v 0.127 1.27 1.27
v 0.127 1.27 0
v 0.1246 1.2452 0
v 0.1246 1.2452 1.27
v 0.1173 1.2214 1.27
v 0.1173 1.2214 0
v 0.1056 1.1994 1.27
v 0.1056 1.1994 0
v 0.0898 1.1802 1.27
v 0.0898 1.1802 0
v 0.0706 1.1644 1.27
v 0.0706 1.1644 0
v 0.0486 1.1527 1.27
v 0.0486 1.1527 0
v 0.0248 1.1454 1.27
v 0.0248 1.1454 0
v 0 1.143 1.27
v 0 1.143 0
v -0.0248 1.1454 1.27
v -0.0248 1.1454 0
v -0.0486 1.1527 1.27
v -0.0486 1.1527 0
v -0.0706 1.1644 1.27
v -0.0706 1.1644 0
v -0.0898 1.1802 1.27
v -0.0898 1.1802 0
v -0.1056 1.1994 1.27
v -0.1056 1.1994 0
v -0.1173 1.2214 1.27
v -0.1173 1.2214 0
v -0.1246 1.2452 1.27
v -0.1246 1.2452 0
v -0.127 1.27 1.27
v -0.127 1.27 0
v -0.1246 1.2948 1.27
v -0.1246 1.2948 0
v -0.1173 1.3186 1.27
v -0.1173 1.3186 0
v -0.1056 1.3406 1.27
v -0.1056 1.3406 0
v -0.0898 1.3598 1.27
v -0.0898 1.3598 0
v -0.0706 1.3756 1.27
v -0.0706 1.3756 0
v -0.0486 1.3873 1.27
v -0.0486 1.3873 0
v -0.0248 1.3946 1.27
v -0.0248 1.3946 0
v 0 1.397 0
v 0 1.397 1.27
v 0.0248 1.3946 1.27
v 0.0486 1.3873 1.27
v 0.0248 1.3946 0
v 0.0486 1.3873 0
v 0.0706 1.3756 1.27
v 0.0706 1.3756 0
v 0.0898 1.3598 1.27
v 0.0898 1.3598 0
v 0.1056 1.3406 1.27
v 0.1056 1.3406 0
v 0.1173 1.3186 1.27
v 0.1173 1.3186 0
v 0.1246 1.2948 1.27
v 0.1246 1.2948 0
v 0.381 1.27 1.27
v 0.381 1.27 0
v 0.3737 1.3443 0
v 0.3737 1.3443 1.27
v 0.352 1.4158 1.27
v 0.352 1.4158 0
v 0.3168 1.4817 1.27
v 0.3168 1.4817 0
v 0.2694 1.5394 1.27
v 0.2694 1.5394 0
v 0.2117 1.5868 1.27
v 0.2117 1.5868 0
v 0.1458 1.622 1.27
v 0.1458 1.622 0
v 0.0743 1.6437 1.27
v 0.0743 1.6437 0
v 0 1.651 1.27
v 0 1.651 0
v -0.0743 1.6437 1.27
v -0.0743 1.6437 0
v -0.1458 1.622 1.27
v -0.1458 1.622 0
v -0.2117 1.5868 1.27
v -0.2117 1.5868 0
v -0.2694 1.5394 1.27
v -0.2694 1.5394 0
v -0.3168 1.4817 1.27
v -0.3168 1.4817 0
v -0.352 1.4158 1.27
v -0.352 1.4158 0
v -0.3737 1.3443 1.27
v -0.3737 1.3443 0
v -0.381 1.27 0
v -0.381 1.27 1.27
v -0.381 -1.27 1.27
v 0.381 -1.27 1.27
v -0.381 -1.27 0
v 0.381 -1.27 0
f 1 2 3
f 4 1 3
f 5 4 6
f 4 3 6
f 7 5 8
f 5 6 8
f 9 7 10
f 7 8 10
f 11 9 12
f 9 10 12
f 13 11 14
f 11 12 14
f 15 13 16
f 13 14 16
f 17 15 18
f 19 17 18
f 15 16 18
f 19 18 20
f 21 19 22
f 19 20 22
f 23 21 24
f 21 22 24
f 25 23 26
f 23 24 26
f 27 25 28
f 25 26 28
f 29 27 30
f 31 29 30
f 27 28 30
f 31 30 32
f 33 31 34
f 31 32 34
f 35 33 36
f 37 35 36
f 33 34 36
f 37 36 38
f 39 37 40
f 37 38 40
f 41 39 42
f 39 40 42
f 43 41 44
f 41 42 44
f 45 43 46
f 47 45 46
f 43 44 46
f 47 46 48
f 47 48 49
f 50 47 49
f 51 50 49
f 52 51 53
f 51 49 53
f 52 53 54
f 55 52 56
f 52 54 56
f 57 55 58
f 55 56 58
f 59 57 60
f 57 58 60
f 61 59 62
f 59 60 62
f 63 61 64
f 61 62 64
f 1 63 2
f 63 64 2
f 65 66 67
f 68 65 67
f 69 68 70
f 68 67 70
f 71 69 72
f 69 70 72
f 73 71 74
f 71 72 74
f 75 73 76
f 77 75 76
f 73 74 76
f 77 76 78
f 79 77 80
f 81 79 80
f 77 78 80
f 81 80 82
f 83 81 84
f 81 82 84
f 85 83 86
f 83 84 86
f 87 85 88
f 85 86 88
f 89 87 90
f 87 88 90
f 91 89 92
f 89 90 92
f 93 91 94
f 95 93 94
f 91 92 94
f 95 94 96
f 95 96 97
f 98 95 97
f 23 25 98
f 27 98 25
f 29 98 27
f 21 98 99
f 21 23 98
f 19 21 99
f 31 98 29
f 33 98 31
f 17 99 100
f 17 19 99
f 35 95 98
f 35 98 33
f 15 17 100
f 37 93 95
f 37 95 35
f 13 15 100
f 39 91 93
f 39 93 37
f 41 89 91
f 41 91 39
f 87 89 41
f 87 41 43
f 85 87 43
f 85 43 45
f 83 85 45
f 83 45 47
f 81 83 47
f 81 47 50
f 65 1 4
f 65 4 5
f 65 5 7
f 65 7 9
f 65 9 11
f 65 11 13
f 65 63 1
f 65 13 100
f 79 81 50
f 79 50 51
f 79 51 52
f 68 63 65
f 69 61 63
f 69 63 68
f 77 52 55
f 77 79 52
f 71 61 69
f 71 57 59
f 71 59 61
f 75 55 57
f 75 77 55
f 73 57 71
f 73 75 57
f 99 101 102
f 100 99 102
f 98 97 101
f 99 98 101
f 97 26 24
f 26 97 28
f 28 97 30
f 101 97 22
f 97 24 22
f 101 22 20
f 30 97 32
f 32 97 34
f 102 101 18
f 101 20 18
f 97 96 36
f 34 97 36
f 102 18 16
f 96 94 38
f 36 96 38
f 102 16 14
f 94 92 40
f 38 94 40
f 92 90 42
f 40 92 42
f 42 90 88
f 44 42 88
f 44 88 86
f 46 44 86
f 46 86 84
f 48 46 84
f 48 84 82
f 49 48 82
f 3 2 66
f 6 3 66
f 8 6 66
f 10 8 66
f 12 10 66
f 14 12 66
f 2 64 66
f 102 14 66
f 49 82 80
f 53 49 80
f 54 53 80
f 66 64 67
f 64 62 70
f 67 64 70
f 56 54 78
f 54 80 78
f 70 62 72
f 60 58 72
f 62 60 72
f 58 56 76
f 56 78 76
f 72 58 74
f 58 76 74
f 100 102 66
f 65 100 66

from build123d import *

# Parameters (mm, degrees)
BOSS_EXTRUDE1_DEPTH = 1.27


with BuildPart() as part:
    # Sketch2 → Boss-Extrude1 (new body)
    with BuildSketch(Plane.XY):
        with BuildLine():
            ThreePointArc((0.381, 1.27), (0, 1.651), (-0.381, 1.27))
            Line((-0.381, 1.27), (-0.127, 1.27))
            ThreePointArc((-0.127, 1.27), (0, 1.397), (0.127, 1.27))
            Line((0.127, 1.27), (0.381, 1.27))
        make_face()
        with BuildLine():
            Line((-0.127, 1.27), (-0.381, 1.27))
            ThreePointArc((-0.381, 1.27), (0, 0.889), (0.381, 1.27))
            Line((0.381, 1.27), (0.127, 1.27))
            ThreePointArc((0.127, 1.27), (0, 1.143), (-0.127, 1.27))
        make_face()
        with BuildLine():
            Line((-0.381, 1.27), (-0.381, -1.27))
            Line((-0.381, -1.27), (0.381, -1.27))
            Line((0.381, -1.27), (0.381, 1.27))
            ThreePointArc((0.381, 1.27), (0, 0.889), (-0.381, 1.27))
        make_face()
    extrude(amount=BOSS_EXTRUDE1_DEPTH)


solid = part.part
